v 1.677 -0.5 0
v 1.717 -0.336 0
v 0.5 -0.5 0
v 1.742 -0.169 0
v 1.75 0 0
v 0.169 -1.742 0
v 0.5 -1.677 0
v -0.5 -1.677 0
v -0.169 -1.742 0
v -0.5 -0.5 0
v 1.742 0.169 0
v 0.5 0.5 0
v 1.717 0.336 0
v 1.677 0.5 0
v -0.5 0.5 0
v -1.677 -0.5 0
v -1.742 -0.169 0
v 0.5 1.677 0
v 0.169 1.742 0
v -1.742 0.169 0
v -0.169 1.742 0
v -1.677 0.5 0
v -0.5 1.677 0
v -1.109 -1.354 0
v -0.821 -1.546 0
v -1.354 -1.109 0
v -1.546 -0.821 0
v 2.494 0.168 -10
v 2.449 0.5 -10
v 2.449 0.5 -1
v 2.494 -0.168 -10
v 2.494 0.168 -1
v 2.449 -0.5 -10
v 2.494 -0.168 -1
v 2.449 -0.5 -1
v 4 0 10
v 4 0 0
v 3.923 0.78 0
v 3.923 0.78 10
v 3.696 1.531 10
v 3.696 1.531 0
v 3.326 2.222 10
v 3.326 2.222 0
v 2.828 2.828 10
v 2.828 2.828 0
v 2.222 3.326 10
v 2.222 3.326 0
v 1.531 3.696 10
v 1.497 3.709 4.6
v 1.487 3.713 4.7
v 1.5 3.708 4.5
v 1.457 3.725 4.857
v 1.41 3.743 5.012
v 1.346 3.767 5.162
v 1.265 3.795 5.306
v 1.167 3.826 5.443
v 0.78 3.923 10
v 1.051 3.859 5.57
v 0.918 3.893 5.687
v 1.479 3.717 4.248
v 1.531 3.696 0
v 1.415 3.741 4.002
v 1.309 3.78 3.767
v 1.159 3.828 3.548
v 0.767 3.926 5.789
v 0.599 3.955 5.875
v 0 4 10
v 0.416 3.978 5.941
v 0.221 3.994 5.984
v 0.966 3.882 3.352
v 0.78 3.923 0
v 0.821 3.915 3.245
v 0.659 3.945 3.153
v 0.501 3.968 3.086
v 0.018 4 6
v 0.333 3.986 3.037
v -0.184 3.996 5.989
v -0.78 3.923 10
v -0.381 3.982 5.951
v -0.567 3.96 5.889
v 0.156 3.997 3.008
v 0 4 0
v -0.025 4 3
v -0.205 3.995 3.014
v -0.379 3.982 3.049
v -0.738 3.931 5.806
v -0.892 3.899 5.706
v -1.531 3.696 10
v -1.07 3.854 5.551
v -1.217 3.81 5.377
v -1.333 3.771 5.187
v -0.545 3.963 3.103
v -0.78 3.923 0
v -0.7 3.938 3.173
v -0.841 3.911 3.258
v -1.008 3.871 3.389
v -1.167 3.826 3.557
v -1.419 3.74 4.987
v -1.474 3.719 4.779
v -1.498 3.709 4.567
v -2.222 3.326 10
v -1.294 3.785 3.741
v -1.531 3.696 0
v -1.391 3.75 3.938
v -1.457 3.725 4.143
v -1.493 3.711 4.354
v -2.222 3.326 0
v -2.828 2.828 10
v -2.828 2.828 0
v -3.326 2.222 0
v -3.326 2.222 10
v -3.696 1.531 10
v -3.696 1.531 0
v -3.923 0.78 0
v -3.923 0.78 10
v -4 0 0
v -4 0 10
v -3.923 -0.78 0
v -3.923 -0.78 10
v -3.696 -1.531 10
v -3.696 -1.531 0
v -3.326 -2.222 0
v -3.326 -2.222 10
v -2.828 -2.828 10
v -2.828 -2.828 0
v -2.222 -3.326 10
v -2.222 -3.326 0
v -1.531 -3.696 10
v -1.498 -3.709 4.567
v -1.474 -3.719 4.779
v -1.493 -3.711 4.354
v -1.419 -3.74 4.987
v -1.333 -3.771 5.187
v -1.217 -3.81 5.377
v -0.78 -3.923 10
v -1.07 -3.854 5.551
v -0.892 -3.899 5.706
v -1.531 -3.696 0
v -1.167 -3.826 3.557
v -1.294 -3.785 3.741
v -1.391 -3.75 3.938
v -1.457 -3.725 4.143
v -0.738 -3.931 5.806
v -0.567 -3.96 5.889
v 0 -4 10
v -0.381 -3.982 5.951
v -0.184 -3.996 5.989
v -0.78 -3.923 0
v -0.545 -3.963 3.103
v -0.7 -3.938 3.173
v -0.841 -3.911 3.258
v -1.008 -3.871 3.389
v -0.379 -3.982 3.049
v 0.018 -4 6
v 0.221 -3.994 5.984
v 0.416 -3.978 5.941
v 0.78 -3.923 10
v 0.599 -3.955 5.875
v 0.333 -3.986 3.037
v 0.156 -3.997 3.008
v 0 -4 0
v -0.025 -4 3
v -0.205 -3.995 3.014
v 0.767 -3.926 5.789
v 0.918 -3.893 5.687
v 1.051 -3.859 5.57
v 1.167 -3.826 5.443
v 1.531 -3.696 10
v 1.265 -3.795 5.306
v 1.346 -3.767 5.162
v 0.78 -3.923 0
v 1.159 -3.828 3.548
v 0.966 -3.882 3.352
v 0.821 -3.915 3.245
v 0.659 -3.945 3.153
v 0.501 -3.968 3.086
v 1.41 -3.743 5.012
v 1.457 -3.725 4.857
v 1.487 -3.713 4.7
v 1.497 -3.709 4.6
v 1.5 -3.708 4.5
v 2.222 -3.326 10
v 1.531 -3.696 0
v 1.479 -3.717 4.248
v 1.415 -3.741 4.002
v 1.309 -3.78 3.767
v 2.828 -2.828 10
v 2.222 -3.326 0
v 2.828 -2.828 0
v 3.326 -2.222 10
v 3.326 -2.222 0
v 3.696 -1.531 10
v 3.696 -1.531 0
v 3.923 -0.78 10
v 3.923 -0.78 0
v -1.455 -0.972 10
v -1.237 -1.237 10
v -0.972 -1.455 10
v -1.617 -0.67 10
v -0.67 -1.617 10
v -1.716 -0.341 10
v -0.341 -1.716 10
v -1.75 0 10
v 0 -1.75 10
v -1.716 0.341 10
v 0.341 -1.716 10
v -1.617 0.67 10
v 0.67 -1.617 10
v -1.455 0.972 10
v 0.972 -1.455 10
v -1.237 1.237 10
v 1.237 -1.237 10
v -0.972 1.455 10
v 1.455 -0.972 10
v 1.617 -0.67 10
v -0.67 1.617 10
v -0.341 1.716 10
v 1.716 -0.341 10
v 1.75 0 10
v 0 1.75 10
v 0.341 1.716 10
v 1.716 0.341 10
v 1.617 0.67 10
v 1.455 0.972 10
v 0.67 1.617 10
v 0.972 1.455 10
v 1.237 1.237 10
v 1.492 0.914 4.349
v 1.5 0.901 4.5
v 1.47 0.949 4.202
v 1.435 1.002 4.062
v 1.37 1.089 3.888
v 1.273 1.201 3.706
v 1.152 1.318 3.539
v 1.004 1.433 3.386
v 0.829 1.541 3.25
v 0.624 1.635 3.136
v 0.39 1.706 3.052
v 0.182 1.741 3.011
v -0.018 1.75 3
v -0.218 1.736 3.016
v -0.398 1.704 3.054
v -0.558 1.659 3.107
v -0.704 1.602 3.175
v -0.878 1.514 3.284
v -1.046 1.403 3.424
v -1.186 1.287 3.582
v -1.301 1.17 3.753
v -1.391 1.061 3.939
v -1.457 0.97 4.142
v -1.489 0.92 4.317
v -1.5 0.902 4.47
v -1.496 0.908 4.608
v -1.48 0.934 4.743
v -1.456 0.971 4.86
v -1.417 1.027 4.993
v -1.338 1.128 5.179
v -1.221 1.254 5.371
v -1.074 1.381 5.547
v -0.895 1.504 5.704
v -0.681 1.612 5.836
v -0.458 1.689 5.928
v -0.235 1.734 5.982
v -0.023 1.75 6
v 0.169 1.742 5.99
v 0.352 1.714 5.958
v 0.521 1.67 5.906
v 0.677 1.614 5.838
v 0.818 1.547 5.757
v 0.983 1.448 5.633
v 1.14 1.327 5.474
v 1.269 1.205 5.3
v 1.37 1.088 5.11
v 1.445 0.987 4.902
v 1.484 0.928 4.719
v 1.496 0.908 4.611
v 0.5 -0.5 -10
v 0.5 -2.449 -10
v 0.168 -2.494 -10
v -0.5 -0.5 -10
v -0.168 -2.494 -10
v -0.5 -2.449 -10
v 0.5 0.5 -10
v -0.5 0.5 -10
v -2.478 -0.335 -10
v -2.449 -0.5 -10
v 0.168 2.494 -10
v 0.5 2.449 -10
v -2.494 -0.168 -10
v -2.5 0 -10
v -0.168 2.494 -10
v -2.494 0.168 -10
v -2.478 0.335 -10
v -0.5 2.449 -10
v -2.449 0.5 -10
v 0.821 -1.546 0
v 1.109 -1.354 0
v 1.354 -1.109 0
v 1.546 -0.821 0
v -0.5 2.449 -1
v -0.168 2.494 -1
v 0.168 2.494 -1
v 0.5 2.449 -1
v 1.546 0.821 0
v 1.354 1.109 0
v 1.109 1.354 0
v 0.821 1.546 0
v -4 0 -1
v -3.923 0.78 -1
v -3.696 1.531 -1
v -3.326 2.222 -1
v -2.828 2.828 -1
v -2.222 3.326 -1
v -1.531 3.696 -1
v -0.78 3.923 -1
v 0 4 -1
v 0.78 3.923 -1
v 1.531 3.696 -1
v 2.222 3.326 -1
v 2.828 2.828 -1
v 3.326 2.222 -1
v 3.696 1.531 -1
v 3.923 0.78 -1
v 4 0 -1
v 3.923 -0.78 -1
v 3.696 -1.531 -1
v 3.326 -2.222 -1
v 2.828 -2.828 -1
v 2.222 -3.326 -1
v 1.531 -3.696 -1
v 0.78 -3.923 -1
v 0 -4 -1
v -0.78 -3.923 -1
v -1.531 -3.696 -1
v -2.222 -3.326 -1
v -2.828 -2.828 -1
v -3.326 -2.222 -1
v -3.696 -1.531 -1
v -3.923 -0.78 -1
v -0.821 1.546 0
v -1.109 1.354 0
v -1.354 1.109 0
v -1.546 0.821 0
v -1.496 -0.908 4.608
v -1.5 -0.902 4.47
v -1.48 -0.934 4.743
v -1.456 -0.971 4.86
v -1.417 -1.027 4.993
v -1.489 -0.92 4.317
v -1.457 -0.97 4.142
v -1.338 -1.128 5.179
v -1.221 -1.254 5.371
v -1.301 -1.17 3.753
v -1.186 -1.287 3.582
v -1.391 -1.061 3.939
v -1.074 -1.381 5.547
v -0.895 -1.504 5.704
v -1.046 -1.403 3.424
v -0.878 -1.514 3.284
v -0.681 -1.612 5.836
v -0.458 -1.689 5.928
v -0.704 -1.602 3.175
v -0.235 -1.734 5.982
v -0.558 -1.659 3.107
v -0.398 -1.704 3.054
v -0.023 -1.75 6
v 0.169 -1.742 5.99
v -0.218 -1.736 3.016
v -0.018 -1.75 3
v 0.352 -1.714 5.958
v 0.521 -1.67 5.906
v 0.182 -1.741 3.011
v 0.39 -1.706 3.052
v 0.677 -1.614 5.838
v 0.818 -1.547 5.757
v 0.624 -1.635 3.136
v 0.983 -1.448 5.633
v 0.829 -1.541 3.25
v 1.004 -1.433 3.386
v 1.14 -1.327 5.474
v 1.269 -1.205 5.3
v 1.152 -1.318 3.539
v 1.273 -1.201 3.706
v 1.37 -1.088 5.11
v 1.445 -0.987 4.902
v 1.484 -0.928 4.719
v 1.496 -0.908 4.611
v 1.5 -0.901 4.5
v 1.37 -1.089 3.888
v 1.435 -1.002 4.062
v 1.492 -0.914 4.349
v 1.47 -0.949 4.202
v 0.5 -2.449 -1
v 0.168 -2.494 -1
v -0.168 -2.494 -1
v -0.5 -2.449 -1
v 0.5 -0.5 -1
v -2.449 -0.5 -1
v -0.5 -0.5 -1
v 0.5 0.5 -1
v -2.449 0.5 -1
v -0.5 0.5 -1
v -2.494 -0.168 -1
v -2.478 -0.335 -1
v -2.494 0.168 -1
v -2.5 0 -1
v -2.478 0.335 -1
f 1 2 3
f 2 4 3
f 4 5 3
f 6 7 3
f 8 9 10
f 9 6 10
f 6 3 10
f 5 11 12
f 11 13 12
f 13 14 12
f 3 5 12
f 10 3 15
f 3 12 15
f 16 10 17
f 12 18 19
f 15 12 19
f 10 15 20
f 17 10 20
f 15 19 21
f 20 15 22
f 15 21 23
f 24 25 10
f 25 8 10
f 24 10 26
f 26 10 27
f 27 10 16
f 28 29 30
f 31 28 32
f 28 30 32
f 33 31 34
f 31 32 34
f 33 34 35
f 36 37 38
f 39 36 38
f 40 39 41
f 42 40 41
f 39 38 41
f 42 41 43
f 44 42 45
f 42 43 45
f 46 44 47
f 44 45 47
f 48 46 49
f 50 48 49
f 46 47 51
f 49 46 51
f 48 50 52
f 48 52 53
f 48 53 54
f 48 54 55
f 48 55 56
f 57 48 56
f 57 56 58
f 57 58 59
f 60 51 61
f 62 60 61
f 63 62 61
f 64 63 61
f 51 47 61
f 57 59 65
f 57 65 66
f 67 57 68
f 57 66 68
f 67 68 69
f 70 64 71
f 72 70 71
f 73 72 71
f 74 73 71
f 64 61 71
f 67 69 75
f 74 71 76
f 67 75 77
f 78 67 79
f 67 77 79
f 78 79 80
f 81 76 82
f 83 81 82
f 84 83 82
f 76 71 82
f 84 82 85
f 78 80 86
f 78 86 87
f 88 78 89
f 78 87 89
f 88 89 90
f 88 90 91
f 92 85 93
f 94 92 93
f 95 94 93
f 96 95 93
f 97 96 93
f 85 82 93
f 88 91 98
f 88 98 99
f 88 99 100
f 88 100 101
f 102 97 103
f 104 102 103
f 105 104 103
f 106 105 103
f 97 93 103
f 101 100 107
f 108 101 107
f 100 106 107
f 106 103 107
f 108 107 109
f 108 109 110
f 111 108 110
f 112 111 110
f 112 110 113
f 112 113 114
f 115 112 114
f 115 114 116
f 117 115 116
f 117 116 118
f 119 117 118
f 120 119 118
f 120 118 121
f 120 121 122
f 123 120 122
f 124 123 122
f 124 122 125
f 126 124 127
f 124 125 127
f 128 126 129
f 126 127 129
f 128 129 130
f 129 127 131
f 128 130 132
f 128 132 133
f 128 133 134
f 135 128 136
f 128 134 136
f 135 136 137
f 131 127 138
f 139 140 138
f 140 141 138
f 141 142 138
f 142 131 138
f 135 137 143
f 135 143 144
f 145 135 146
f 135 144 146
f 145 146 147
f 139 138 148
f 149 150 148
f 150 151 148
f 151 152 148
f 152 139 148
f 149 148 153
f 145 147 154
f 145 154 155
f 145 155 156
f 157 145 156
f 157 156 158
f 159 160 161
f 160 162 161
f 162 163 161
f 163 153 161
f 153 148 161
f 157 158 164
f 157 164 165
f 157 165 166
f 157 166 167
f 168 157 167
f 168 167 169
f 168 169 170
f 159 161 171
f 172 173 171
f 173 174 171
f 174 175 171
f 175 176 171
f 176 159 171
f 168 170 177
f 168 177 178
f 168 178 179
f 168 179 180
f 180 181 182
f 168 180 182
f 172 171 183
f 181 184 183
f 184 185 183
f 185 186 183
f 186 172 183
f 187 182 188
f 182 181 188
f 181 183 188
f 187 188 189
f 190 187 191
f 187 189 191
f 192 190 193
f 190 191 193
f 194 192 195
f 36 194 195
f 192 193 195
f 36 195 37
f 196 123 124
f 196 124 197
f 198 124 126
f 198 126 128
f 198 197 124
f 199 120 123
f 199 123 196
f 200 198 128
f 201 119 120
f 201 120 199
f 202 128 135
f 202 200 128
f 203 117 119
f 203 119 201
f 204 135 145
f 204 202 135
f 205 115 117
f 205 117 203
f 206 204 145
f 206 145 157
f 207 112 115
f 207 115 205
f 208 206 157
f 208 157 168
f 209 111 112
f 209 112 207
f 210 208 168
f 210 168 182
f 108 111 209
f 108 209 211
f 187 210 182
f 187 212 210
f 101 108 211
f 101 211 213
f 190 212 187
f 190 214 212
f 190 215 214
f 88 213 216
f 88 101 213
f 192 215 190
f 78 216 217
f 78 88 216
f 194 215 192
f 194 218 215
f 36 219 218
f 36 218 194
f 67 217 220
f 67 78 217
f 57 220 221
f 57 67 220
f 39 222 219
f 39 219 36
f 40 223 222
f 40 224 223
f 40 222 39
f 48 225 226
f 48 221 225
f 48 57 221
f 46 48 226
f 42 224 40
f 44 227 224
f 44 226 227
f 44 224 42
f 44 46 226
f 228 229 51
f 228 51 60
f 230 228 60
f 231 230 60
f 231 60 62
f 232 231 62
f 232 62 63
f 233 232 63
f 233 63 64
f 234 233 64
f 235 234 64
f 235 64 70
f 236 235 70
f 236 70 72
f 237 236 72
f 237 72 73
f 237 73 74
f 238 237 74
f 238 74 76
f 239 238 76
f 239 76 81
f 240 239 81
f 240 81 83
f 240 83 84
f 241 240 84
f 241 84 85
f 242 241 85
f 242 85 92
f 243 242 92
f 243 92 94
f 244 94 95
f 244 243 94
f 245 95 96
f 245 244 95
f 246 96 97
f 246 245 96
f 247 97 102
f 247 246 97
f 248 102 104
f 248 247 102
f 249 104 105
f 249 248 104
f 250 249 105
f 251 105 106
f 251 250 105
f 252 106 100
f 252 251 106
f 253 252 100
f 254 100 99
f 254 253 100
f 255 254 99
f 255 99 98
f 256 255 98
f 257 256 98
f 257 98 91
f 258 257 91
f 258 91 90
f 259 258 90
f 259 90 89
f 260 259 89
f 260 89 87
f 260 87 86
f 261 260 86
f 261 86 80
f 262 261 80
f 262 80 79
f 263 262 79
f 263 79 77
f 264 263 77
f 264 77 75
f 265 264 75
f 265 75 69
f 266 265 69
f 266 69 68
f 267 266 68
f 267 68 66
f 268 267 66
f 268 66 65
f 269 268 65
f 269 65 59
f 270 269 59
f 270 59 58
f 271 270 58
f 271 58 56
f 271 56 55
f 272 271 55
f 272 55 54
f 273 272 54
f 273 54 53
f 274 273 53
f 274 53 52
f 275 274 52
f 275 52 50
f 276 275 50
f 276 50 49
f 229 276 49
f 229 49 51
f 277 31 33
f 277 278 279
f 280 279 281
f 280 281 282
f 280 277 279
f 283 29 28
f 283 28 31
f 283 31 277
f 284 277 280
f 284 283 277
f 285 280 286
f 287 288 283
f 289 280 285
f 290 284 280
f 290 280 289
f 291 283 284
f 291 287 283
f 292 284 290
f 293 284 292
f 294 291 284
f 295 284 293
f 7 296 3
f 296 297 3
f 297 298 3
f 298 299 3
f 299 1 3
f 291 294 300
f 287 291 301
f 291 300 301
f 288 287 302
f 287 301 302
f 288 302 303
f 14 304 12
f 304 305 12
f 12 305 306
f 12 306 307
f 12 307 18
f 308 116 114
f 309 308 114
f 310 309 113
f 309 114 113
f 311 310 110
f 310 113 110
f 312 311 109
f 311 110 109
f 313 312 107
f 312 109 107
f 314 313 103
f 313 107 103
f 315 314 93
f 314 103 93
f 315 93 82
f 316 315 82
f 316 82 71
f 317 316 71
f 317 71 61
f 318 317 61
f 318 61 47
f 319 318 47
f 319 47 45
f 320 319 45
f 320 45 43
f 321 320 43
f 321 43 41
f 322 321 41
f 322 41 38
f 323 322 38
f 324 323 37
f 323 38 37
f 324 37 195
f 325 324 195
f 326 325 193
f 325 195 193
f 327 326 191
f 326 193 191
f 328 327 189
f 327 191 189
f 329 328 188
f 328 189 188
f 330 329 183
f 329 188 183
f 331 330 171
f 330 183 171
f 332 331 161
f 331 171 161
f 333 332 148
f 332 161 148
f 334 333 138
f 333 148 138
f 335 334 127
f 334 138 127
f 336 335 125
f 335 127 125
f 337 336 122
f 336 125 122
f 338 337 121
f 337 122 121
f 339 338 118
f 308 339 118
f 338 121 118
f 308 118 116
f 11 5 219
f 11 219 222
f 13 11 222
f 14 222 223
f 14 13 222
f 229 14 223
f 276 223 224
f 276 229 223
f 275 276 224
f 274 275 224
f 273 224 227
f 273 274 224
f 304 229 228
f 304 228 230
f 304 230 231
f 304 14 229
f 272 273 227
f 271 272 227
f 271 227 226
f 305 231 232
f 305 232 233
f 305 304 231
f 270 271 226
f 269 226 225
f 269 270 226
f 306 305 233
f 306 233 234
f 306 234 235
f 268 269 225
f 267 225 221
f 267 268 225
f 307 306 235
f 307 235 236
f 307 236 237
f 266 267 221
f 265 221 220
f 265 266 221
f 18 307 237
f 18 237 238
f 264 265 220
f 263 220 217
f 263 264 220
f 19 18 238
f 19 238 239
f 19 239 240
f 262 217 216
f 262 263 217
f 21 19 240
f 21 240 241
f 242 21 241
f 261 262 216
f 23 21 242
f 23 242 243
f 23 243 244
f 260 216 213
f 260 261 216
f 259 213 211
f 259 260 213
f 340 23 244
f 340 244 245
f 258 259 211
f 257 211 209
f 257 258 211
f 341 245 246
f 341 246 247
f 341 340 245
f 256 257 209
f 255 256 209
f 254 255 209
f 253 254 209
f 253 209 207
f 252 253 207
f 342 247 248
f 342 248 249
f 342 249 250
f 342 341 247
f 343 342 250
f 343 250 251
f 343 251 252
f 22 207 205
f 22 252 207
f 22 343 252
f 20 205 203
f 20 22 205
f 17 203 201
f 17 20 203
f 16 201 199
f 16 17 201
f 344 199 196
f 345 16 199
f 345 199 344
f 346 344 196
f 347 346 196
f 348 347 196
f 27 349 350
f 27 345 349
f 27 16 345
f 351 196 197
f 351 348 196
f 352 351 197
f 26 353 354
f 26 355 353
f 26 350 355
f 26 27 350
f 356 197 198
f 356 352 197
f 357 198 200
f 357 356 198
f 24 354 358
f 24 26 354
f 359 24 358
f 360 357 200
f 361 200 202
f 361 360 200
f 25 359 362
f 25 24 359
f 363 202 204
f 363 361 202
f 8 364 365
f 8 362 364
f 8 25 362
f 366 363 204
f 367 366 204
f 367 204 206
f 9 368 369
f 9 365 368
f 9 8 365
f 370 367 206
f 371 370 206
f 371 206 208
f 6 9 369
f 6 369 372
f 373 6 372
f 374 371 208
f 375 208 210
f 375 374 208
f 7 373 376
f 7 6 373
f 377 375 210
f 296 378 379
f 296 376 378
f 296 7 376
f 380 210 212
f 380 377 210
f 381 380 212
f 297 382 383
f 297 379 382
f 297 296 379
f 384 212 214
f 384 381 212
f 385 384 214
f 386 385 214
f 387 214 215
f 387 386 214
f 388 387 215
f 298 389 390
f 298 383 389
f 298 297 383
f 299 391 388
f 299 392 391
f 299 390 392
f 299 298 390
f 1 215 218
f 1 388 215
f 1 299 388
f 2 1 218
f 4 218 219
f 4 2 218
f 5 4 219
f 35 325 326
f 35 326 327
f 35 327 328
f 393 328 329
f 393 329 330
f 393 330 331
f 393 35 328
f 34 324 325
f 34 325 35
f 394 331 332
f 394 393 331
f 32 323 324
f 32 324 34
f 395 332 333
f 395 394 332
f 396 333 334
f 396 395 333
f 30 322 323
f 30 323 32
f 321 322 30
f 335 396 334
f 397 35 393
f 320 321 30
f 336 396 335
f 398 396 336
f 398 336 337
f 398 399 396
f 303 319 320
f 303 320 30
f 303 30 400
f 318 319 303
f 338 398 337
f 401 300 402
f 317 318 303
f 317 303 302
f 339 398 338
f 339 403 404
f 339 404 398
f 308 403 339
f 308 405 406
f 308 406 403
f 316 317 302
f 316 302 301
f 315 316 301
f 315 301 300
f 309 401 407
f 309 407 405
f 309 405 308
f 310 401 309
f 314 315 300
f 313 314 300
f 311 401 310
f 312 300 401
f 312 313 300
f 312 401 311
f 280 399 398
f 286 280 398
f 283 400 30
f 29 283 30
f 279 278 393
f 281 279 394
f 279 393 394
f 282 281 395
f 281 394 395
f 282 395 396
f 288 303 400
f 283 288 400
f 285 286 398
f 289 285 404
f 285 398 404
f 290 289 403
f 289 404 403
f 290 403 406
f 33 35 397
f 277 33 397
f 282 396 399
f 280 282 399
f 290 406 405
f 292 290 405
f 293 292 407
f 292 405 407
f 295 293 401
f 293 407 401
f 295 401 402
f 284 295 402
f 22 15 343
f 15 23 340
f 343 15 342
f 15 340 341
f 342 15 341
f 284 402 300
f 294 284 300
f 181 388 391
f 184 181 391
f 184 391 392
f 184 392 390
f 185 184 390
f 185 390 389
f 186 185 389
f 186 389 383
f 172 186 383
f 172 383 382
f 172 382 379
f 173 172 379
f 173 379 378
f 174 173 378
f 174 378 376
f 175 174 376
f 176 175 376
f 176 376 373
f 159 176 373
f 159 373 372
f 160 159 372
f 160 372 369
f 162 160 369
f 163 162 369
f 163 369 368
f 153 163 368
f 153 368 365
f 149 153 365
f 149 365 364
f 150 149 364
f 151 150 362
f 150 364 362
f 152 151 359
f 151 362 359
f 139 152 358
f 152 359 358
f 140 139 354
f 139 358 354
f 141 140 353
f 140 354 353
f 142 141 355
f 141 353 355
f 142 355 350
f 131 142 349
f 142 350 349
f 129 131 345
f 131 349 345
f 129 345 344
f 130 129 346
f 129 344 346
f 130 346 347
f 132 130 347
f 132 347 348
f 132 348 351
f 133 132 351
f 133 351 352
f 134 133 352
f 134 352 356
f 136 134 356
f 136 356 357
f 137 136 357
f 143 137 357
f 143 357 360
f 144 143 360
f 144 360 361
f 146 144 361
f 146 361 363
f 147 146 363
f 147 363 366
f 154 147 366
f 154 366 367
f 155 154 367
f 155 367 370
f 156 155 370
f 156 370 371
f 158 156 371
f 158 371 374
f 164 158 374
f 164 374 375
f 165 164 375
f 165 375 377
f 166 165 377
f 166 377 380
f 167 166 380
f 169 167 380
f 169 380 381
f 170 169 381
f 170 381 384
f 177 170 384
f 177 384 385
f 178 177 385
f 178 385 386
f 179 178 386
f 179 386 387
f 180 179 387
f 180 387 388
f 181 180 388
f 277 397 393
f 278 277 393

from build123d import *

# Parameters (mm, degrees)
SKETCH1_R               = 4
SKETCH1_R_2             = 1.75
BOSS_EXTRUDE1_DEPTH     = 10
SKETCH2_W               = 1
SKETCH2_H               = 1
BOSS_EXTRUDE2_DEPTH     = 10
SKETCH3_R               = 4
BOSS_EXTRUDE3_DEPTH     = 1
SKETCH4_R               = 1.5
CUT_EXTRUDE1_DEPTH      = 5
CUT_EXTRUDE1_DEPTH_BACK = 5


with BuildPart() as part:
    # Sketch1 → Boss-Extrude1 (new body)
    with BuildSketch(Plane.XY):
        Circle(SKETCH1_R)
        Circle(SKETCH1_R_2, mode=Mode.SUBTRACT)
    extrude(amount=BOSS_EXTRUDE1_DEPTH)

    # Sketch2 → Boss-Extrude2 (add)
    with BuildSketch(Plane(origin=(0, 0, 0), x_dir=(-1, 0, 0), z_dir=(0, 0, -1))):
        with BuildLine():
            ThreePointArc((0.5, 1.677050983), (0, 1.75), (-0.5, 1.677050983))
            Line((-0.5, 1.677050983), (-0.5, 0.5))
            Line((-0.5, 0.5), (0.5, 0.5))
            Line((0.5, 0.5), (0.5, 1.677050983))
        make_face()
        with BuildLine():
            ThreePointArc((0.5, 2.449489743), (0, 2.5), (-0.5, 2.449489743))
            Line((-0.5, 2.449489743), (-0.5, 1.677050983))
            ThreePointArc((-0.5, 1.677050983), (0, 1.75), (0.5, 1.677050983))
            Line((0.5, 1.677050983), (0.5, 2.449489743))
        make_face()
        with BuildLine():
            Line((-0.5, -1.677050983), (-0.5, -2.449489743))
            ThreePointArc((-0.5, -2.449489743), (0, -2.5), (0.5, -2.449489743))
            Line((0.5, -2.449489743), (0.5, -1.677050983))
            ThreePointArc((0.5, -1.677050983), (0, -1.75), (-0.5, -1.677050983))
        make_face()
        with BuildLine():
            Line((-0.5, -0.5), (-0.5, 0.5))
            Line((-0.5, 0.5), (-1.677050983, 0.5))
            ThreePointArc((-1.677050983, 0.5), (-1.75, 0), (-1.677050983, -0.5))
            Line((-1.677050983, -0.5), (-0.5, -0.5))
        make_face()
        with BuildLine():
            Line((-1.677050983, 0.5), (-2.449489743, 0.5))
            ThreePointArc((-2.449489743, 0.5), (-2.5, 0), (-2.449489743, -0.5))
            Line((-2.449489743, -0.5), (-1.677050983, -0.5))
            ThreePointArc((-1.677050983, -0.5), (-1.75, 0), (-1.677050983, 0.5))
        make_face()
        with BuildLine():
            ThreePointArc((2.5, 0), (2.487340383, 0.251272405), (2.449489743, 0.5))
            Line((2.449489743, 0.5), (1.677050983, 0.5))
            ThreePointArc((1.677050983, 0.5), (1.731666715, 0.252646769), (1.75, 0))
            ThreePointArc((1.75, 0), (1.731666715, -0.252646769), (1.677050983, -0.5))
            Line((1.677050983, -0.5), (2.449489743, -0.5))
            ThreePointArc((2.449489743, -0.5), (2.487340383, -0.251272405), (2.5, 0))
        make_face()
        with BuildLine():
            Line((0.5, -0.5), (-0.5, -0.5))
            Line((-0.5, -0.5), (-0.5, -1.677050983))
            ThreePointArc((-0.5, -1.677050983), (0, -1.75), (0.5, -1.677050983))
            Line((0.5, -1.677050983), (0.5, -0.5))
        make_face()
        Rectangle(SKETCH2_W, SKETCH2_H)
        with BuildLine():
            Line((1.677050983, 0.5), (0.5, 0.5))
            Line((0.5, 0.5), (0.5, -0.5))
            Line((0.5, -0.5), (1.677050983, -0.5))
            ThreePointArc((1.677050983, -0.5), (1.731666715, -0.252646769), (1.75, 0))
            ThreePointArc((1.75, 0), (1.731666715, 0.252646769), (1.677050983, 0.5))
        make_face()
    extrude(amount=BOSS_EXTRUDE2_DEPTH)

    # Sketch3 → Boss-Extrude3 (add)
    with BuildSketch(Plane(origin=(0, 0, 0), x_dir=(-1, 0, 0), z_dir=(0, 0, -1))):
        Circle(SKETCH3_R)
    extrude(amount=BOSS_EXTRUDE3_DEPTH)

    # Sketch4 → Cut-Extrude1 (cut, two sides)
    with BuildSketch(Plane(origin=(0, 0, 0), x_dir=(1, 0, 0), z_dir=(0, 1, 0))) as cut_extrude1_sk:
        with Locations((0, -4.5)):
            Circle(SKETCH4_R)
    extrude(amount=CUT_EXTRUDE1_DEPTH, mode=Mode.SUBTRACT)
    extrude(cut_extrude1_sk.sketch, amount=-CUT_EXTRUDE1_DEPTH_BACK, mode=Mode.SUBTRACT)


solid = part.part
